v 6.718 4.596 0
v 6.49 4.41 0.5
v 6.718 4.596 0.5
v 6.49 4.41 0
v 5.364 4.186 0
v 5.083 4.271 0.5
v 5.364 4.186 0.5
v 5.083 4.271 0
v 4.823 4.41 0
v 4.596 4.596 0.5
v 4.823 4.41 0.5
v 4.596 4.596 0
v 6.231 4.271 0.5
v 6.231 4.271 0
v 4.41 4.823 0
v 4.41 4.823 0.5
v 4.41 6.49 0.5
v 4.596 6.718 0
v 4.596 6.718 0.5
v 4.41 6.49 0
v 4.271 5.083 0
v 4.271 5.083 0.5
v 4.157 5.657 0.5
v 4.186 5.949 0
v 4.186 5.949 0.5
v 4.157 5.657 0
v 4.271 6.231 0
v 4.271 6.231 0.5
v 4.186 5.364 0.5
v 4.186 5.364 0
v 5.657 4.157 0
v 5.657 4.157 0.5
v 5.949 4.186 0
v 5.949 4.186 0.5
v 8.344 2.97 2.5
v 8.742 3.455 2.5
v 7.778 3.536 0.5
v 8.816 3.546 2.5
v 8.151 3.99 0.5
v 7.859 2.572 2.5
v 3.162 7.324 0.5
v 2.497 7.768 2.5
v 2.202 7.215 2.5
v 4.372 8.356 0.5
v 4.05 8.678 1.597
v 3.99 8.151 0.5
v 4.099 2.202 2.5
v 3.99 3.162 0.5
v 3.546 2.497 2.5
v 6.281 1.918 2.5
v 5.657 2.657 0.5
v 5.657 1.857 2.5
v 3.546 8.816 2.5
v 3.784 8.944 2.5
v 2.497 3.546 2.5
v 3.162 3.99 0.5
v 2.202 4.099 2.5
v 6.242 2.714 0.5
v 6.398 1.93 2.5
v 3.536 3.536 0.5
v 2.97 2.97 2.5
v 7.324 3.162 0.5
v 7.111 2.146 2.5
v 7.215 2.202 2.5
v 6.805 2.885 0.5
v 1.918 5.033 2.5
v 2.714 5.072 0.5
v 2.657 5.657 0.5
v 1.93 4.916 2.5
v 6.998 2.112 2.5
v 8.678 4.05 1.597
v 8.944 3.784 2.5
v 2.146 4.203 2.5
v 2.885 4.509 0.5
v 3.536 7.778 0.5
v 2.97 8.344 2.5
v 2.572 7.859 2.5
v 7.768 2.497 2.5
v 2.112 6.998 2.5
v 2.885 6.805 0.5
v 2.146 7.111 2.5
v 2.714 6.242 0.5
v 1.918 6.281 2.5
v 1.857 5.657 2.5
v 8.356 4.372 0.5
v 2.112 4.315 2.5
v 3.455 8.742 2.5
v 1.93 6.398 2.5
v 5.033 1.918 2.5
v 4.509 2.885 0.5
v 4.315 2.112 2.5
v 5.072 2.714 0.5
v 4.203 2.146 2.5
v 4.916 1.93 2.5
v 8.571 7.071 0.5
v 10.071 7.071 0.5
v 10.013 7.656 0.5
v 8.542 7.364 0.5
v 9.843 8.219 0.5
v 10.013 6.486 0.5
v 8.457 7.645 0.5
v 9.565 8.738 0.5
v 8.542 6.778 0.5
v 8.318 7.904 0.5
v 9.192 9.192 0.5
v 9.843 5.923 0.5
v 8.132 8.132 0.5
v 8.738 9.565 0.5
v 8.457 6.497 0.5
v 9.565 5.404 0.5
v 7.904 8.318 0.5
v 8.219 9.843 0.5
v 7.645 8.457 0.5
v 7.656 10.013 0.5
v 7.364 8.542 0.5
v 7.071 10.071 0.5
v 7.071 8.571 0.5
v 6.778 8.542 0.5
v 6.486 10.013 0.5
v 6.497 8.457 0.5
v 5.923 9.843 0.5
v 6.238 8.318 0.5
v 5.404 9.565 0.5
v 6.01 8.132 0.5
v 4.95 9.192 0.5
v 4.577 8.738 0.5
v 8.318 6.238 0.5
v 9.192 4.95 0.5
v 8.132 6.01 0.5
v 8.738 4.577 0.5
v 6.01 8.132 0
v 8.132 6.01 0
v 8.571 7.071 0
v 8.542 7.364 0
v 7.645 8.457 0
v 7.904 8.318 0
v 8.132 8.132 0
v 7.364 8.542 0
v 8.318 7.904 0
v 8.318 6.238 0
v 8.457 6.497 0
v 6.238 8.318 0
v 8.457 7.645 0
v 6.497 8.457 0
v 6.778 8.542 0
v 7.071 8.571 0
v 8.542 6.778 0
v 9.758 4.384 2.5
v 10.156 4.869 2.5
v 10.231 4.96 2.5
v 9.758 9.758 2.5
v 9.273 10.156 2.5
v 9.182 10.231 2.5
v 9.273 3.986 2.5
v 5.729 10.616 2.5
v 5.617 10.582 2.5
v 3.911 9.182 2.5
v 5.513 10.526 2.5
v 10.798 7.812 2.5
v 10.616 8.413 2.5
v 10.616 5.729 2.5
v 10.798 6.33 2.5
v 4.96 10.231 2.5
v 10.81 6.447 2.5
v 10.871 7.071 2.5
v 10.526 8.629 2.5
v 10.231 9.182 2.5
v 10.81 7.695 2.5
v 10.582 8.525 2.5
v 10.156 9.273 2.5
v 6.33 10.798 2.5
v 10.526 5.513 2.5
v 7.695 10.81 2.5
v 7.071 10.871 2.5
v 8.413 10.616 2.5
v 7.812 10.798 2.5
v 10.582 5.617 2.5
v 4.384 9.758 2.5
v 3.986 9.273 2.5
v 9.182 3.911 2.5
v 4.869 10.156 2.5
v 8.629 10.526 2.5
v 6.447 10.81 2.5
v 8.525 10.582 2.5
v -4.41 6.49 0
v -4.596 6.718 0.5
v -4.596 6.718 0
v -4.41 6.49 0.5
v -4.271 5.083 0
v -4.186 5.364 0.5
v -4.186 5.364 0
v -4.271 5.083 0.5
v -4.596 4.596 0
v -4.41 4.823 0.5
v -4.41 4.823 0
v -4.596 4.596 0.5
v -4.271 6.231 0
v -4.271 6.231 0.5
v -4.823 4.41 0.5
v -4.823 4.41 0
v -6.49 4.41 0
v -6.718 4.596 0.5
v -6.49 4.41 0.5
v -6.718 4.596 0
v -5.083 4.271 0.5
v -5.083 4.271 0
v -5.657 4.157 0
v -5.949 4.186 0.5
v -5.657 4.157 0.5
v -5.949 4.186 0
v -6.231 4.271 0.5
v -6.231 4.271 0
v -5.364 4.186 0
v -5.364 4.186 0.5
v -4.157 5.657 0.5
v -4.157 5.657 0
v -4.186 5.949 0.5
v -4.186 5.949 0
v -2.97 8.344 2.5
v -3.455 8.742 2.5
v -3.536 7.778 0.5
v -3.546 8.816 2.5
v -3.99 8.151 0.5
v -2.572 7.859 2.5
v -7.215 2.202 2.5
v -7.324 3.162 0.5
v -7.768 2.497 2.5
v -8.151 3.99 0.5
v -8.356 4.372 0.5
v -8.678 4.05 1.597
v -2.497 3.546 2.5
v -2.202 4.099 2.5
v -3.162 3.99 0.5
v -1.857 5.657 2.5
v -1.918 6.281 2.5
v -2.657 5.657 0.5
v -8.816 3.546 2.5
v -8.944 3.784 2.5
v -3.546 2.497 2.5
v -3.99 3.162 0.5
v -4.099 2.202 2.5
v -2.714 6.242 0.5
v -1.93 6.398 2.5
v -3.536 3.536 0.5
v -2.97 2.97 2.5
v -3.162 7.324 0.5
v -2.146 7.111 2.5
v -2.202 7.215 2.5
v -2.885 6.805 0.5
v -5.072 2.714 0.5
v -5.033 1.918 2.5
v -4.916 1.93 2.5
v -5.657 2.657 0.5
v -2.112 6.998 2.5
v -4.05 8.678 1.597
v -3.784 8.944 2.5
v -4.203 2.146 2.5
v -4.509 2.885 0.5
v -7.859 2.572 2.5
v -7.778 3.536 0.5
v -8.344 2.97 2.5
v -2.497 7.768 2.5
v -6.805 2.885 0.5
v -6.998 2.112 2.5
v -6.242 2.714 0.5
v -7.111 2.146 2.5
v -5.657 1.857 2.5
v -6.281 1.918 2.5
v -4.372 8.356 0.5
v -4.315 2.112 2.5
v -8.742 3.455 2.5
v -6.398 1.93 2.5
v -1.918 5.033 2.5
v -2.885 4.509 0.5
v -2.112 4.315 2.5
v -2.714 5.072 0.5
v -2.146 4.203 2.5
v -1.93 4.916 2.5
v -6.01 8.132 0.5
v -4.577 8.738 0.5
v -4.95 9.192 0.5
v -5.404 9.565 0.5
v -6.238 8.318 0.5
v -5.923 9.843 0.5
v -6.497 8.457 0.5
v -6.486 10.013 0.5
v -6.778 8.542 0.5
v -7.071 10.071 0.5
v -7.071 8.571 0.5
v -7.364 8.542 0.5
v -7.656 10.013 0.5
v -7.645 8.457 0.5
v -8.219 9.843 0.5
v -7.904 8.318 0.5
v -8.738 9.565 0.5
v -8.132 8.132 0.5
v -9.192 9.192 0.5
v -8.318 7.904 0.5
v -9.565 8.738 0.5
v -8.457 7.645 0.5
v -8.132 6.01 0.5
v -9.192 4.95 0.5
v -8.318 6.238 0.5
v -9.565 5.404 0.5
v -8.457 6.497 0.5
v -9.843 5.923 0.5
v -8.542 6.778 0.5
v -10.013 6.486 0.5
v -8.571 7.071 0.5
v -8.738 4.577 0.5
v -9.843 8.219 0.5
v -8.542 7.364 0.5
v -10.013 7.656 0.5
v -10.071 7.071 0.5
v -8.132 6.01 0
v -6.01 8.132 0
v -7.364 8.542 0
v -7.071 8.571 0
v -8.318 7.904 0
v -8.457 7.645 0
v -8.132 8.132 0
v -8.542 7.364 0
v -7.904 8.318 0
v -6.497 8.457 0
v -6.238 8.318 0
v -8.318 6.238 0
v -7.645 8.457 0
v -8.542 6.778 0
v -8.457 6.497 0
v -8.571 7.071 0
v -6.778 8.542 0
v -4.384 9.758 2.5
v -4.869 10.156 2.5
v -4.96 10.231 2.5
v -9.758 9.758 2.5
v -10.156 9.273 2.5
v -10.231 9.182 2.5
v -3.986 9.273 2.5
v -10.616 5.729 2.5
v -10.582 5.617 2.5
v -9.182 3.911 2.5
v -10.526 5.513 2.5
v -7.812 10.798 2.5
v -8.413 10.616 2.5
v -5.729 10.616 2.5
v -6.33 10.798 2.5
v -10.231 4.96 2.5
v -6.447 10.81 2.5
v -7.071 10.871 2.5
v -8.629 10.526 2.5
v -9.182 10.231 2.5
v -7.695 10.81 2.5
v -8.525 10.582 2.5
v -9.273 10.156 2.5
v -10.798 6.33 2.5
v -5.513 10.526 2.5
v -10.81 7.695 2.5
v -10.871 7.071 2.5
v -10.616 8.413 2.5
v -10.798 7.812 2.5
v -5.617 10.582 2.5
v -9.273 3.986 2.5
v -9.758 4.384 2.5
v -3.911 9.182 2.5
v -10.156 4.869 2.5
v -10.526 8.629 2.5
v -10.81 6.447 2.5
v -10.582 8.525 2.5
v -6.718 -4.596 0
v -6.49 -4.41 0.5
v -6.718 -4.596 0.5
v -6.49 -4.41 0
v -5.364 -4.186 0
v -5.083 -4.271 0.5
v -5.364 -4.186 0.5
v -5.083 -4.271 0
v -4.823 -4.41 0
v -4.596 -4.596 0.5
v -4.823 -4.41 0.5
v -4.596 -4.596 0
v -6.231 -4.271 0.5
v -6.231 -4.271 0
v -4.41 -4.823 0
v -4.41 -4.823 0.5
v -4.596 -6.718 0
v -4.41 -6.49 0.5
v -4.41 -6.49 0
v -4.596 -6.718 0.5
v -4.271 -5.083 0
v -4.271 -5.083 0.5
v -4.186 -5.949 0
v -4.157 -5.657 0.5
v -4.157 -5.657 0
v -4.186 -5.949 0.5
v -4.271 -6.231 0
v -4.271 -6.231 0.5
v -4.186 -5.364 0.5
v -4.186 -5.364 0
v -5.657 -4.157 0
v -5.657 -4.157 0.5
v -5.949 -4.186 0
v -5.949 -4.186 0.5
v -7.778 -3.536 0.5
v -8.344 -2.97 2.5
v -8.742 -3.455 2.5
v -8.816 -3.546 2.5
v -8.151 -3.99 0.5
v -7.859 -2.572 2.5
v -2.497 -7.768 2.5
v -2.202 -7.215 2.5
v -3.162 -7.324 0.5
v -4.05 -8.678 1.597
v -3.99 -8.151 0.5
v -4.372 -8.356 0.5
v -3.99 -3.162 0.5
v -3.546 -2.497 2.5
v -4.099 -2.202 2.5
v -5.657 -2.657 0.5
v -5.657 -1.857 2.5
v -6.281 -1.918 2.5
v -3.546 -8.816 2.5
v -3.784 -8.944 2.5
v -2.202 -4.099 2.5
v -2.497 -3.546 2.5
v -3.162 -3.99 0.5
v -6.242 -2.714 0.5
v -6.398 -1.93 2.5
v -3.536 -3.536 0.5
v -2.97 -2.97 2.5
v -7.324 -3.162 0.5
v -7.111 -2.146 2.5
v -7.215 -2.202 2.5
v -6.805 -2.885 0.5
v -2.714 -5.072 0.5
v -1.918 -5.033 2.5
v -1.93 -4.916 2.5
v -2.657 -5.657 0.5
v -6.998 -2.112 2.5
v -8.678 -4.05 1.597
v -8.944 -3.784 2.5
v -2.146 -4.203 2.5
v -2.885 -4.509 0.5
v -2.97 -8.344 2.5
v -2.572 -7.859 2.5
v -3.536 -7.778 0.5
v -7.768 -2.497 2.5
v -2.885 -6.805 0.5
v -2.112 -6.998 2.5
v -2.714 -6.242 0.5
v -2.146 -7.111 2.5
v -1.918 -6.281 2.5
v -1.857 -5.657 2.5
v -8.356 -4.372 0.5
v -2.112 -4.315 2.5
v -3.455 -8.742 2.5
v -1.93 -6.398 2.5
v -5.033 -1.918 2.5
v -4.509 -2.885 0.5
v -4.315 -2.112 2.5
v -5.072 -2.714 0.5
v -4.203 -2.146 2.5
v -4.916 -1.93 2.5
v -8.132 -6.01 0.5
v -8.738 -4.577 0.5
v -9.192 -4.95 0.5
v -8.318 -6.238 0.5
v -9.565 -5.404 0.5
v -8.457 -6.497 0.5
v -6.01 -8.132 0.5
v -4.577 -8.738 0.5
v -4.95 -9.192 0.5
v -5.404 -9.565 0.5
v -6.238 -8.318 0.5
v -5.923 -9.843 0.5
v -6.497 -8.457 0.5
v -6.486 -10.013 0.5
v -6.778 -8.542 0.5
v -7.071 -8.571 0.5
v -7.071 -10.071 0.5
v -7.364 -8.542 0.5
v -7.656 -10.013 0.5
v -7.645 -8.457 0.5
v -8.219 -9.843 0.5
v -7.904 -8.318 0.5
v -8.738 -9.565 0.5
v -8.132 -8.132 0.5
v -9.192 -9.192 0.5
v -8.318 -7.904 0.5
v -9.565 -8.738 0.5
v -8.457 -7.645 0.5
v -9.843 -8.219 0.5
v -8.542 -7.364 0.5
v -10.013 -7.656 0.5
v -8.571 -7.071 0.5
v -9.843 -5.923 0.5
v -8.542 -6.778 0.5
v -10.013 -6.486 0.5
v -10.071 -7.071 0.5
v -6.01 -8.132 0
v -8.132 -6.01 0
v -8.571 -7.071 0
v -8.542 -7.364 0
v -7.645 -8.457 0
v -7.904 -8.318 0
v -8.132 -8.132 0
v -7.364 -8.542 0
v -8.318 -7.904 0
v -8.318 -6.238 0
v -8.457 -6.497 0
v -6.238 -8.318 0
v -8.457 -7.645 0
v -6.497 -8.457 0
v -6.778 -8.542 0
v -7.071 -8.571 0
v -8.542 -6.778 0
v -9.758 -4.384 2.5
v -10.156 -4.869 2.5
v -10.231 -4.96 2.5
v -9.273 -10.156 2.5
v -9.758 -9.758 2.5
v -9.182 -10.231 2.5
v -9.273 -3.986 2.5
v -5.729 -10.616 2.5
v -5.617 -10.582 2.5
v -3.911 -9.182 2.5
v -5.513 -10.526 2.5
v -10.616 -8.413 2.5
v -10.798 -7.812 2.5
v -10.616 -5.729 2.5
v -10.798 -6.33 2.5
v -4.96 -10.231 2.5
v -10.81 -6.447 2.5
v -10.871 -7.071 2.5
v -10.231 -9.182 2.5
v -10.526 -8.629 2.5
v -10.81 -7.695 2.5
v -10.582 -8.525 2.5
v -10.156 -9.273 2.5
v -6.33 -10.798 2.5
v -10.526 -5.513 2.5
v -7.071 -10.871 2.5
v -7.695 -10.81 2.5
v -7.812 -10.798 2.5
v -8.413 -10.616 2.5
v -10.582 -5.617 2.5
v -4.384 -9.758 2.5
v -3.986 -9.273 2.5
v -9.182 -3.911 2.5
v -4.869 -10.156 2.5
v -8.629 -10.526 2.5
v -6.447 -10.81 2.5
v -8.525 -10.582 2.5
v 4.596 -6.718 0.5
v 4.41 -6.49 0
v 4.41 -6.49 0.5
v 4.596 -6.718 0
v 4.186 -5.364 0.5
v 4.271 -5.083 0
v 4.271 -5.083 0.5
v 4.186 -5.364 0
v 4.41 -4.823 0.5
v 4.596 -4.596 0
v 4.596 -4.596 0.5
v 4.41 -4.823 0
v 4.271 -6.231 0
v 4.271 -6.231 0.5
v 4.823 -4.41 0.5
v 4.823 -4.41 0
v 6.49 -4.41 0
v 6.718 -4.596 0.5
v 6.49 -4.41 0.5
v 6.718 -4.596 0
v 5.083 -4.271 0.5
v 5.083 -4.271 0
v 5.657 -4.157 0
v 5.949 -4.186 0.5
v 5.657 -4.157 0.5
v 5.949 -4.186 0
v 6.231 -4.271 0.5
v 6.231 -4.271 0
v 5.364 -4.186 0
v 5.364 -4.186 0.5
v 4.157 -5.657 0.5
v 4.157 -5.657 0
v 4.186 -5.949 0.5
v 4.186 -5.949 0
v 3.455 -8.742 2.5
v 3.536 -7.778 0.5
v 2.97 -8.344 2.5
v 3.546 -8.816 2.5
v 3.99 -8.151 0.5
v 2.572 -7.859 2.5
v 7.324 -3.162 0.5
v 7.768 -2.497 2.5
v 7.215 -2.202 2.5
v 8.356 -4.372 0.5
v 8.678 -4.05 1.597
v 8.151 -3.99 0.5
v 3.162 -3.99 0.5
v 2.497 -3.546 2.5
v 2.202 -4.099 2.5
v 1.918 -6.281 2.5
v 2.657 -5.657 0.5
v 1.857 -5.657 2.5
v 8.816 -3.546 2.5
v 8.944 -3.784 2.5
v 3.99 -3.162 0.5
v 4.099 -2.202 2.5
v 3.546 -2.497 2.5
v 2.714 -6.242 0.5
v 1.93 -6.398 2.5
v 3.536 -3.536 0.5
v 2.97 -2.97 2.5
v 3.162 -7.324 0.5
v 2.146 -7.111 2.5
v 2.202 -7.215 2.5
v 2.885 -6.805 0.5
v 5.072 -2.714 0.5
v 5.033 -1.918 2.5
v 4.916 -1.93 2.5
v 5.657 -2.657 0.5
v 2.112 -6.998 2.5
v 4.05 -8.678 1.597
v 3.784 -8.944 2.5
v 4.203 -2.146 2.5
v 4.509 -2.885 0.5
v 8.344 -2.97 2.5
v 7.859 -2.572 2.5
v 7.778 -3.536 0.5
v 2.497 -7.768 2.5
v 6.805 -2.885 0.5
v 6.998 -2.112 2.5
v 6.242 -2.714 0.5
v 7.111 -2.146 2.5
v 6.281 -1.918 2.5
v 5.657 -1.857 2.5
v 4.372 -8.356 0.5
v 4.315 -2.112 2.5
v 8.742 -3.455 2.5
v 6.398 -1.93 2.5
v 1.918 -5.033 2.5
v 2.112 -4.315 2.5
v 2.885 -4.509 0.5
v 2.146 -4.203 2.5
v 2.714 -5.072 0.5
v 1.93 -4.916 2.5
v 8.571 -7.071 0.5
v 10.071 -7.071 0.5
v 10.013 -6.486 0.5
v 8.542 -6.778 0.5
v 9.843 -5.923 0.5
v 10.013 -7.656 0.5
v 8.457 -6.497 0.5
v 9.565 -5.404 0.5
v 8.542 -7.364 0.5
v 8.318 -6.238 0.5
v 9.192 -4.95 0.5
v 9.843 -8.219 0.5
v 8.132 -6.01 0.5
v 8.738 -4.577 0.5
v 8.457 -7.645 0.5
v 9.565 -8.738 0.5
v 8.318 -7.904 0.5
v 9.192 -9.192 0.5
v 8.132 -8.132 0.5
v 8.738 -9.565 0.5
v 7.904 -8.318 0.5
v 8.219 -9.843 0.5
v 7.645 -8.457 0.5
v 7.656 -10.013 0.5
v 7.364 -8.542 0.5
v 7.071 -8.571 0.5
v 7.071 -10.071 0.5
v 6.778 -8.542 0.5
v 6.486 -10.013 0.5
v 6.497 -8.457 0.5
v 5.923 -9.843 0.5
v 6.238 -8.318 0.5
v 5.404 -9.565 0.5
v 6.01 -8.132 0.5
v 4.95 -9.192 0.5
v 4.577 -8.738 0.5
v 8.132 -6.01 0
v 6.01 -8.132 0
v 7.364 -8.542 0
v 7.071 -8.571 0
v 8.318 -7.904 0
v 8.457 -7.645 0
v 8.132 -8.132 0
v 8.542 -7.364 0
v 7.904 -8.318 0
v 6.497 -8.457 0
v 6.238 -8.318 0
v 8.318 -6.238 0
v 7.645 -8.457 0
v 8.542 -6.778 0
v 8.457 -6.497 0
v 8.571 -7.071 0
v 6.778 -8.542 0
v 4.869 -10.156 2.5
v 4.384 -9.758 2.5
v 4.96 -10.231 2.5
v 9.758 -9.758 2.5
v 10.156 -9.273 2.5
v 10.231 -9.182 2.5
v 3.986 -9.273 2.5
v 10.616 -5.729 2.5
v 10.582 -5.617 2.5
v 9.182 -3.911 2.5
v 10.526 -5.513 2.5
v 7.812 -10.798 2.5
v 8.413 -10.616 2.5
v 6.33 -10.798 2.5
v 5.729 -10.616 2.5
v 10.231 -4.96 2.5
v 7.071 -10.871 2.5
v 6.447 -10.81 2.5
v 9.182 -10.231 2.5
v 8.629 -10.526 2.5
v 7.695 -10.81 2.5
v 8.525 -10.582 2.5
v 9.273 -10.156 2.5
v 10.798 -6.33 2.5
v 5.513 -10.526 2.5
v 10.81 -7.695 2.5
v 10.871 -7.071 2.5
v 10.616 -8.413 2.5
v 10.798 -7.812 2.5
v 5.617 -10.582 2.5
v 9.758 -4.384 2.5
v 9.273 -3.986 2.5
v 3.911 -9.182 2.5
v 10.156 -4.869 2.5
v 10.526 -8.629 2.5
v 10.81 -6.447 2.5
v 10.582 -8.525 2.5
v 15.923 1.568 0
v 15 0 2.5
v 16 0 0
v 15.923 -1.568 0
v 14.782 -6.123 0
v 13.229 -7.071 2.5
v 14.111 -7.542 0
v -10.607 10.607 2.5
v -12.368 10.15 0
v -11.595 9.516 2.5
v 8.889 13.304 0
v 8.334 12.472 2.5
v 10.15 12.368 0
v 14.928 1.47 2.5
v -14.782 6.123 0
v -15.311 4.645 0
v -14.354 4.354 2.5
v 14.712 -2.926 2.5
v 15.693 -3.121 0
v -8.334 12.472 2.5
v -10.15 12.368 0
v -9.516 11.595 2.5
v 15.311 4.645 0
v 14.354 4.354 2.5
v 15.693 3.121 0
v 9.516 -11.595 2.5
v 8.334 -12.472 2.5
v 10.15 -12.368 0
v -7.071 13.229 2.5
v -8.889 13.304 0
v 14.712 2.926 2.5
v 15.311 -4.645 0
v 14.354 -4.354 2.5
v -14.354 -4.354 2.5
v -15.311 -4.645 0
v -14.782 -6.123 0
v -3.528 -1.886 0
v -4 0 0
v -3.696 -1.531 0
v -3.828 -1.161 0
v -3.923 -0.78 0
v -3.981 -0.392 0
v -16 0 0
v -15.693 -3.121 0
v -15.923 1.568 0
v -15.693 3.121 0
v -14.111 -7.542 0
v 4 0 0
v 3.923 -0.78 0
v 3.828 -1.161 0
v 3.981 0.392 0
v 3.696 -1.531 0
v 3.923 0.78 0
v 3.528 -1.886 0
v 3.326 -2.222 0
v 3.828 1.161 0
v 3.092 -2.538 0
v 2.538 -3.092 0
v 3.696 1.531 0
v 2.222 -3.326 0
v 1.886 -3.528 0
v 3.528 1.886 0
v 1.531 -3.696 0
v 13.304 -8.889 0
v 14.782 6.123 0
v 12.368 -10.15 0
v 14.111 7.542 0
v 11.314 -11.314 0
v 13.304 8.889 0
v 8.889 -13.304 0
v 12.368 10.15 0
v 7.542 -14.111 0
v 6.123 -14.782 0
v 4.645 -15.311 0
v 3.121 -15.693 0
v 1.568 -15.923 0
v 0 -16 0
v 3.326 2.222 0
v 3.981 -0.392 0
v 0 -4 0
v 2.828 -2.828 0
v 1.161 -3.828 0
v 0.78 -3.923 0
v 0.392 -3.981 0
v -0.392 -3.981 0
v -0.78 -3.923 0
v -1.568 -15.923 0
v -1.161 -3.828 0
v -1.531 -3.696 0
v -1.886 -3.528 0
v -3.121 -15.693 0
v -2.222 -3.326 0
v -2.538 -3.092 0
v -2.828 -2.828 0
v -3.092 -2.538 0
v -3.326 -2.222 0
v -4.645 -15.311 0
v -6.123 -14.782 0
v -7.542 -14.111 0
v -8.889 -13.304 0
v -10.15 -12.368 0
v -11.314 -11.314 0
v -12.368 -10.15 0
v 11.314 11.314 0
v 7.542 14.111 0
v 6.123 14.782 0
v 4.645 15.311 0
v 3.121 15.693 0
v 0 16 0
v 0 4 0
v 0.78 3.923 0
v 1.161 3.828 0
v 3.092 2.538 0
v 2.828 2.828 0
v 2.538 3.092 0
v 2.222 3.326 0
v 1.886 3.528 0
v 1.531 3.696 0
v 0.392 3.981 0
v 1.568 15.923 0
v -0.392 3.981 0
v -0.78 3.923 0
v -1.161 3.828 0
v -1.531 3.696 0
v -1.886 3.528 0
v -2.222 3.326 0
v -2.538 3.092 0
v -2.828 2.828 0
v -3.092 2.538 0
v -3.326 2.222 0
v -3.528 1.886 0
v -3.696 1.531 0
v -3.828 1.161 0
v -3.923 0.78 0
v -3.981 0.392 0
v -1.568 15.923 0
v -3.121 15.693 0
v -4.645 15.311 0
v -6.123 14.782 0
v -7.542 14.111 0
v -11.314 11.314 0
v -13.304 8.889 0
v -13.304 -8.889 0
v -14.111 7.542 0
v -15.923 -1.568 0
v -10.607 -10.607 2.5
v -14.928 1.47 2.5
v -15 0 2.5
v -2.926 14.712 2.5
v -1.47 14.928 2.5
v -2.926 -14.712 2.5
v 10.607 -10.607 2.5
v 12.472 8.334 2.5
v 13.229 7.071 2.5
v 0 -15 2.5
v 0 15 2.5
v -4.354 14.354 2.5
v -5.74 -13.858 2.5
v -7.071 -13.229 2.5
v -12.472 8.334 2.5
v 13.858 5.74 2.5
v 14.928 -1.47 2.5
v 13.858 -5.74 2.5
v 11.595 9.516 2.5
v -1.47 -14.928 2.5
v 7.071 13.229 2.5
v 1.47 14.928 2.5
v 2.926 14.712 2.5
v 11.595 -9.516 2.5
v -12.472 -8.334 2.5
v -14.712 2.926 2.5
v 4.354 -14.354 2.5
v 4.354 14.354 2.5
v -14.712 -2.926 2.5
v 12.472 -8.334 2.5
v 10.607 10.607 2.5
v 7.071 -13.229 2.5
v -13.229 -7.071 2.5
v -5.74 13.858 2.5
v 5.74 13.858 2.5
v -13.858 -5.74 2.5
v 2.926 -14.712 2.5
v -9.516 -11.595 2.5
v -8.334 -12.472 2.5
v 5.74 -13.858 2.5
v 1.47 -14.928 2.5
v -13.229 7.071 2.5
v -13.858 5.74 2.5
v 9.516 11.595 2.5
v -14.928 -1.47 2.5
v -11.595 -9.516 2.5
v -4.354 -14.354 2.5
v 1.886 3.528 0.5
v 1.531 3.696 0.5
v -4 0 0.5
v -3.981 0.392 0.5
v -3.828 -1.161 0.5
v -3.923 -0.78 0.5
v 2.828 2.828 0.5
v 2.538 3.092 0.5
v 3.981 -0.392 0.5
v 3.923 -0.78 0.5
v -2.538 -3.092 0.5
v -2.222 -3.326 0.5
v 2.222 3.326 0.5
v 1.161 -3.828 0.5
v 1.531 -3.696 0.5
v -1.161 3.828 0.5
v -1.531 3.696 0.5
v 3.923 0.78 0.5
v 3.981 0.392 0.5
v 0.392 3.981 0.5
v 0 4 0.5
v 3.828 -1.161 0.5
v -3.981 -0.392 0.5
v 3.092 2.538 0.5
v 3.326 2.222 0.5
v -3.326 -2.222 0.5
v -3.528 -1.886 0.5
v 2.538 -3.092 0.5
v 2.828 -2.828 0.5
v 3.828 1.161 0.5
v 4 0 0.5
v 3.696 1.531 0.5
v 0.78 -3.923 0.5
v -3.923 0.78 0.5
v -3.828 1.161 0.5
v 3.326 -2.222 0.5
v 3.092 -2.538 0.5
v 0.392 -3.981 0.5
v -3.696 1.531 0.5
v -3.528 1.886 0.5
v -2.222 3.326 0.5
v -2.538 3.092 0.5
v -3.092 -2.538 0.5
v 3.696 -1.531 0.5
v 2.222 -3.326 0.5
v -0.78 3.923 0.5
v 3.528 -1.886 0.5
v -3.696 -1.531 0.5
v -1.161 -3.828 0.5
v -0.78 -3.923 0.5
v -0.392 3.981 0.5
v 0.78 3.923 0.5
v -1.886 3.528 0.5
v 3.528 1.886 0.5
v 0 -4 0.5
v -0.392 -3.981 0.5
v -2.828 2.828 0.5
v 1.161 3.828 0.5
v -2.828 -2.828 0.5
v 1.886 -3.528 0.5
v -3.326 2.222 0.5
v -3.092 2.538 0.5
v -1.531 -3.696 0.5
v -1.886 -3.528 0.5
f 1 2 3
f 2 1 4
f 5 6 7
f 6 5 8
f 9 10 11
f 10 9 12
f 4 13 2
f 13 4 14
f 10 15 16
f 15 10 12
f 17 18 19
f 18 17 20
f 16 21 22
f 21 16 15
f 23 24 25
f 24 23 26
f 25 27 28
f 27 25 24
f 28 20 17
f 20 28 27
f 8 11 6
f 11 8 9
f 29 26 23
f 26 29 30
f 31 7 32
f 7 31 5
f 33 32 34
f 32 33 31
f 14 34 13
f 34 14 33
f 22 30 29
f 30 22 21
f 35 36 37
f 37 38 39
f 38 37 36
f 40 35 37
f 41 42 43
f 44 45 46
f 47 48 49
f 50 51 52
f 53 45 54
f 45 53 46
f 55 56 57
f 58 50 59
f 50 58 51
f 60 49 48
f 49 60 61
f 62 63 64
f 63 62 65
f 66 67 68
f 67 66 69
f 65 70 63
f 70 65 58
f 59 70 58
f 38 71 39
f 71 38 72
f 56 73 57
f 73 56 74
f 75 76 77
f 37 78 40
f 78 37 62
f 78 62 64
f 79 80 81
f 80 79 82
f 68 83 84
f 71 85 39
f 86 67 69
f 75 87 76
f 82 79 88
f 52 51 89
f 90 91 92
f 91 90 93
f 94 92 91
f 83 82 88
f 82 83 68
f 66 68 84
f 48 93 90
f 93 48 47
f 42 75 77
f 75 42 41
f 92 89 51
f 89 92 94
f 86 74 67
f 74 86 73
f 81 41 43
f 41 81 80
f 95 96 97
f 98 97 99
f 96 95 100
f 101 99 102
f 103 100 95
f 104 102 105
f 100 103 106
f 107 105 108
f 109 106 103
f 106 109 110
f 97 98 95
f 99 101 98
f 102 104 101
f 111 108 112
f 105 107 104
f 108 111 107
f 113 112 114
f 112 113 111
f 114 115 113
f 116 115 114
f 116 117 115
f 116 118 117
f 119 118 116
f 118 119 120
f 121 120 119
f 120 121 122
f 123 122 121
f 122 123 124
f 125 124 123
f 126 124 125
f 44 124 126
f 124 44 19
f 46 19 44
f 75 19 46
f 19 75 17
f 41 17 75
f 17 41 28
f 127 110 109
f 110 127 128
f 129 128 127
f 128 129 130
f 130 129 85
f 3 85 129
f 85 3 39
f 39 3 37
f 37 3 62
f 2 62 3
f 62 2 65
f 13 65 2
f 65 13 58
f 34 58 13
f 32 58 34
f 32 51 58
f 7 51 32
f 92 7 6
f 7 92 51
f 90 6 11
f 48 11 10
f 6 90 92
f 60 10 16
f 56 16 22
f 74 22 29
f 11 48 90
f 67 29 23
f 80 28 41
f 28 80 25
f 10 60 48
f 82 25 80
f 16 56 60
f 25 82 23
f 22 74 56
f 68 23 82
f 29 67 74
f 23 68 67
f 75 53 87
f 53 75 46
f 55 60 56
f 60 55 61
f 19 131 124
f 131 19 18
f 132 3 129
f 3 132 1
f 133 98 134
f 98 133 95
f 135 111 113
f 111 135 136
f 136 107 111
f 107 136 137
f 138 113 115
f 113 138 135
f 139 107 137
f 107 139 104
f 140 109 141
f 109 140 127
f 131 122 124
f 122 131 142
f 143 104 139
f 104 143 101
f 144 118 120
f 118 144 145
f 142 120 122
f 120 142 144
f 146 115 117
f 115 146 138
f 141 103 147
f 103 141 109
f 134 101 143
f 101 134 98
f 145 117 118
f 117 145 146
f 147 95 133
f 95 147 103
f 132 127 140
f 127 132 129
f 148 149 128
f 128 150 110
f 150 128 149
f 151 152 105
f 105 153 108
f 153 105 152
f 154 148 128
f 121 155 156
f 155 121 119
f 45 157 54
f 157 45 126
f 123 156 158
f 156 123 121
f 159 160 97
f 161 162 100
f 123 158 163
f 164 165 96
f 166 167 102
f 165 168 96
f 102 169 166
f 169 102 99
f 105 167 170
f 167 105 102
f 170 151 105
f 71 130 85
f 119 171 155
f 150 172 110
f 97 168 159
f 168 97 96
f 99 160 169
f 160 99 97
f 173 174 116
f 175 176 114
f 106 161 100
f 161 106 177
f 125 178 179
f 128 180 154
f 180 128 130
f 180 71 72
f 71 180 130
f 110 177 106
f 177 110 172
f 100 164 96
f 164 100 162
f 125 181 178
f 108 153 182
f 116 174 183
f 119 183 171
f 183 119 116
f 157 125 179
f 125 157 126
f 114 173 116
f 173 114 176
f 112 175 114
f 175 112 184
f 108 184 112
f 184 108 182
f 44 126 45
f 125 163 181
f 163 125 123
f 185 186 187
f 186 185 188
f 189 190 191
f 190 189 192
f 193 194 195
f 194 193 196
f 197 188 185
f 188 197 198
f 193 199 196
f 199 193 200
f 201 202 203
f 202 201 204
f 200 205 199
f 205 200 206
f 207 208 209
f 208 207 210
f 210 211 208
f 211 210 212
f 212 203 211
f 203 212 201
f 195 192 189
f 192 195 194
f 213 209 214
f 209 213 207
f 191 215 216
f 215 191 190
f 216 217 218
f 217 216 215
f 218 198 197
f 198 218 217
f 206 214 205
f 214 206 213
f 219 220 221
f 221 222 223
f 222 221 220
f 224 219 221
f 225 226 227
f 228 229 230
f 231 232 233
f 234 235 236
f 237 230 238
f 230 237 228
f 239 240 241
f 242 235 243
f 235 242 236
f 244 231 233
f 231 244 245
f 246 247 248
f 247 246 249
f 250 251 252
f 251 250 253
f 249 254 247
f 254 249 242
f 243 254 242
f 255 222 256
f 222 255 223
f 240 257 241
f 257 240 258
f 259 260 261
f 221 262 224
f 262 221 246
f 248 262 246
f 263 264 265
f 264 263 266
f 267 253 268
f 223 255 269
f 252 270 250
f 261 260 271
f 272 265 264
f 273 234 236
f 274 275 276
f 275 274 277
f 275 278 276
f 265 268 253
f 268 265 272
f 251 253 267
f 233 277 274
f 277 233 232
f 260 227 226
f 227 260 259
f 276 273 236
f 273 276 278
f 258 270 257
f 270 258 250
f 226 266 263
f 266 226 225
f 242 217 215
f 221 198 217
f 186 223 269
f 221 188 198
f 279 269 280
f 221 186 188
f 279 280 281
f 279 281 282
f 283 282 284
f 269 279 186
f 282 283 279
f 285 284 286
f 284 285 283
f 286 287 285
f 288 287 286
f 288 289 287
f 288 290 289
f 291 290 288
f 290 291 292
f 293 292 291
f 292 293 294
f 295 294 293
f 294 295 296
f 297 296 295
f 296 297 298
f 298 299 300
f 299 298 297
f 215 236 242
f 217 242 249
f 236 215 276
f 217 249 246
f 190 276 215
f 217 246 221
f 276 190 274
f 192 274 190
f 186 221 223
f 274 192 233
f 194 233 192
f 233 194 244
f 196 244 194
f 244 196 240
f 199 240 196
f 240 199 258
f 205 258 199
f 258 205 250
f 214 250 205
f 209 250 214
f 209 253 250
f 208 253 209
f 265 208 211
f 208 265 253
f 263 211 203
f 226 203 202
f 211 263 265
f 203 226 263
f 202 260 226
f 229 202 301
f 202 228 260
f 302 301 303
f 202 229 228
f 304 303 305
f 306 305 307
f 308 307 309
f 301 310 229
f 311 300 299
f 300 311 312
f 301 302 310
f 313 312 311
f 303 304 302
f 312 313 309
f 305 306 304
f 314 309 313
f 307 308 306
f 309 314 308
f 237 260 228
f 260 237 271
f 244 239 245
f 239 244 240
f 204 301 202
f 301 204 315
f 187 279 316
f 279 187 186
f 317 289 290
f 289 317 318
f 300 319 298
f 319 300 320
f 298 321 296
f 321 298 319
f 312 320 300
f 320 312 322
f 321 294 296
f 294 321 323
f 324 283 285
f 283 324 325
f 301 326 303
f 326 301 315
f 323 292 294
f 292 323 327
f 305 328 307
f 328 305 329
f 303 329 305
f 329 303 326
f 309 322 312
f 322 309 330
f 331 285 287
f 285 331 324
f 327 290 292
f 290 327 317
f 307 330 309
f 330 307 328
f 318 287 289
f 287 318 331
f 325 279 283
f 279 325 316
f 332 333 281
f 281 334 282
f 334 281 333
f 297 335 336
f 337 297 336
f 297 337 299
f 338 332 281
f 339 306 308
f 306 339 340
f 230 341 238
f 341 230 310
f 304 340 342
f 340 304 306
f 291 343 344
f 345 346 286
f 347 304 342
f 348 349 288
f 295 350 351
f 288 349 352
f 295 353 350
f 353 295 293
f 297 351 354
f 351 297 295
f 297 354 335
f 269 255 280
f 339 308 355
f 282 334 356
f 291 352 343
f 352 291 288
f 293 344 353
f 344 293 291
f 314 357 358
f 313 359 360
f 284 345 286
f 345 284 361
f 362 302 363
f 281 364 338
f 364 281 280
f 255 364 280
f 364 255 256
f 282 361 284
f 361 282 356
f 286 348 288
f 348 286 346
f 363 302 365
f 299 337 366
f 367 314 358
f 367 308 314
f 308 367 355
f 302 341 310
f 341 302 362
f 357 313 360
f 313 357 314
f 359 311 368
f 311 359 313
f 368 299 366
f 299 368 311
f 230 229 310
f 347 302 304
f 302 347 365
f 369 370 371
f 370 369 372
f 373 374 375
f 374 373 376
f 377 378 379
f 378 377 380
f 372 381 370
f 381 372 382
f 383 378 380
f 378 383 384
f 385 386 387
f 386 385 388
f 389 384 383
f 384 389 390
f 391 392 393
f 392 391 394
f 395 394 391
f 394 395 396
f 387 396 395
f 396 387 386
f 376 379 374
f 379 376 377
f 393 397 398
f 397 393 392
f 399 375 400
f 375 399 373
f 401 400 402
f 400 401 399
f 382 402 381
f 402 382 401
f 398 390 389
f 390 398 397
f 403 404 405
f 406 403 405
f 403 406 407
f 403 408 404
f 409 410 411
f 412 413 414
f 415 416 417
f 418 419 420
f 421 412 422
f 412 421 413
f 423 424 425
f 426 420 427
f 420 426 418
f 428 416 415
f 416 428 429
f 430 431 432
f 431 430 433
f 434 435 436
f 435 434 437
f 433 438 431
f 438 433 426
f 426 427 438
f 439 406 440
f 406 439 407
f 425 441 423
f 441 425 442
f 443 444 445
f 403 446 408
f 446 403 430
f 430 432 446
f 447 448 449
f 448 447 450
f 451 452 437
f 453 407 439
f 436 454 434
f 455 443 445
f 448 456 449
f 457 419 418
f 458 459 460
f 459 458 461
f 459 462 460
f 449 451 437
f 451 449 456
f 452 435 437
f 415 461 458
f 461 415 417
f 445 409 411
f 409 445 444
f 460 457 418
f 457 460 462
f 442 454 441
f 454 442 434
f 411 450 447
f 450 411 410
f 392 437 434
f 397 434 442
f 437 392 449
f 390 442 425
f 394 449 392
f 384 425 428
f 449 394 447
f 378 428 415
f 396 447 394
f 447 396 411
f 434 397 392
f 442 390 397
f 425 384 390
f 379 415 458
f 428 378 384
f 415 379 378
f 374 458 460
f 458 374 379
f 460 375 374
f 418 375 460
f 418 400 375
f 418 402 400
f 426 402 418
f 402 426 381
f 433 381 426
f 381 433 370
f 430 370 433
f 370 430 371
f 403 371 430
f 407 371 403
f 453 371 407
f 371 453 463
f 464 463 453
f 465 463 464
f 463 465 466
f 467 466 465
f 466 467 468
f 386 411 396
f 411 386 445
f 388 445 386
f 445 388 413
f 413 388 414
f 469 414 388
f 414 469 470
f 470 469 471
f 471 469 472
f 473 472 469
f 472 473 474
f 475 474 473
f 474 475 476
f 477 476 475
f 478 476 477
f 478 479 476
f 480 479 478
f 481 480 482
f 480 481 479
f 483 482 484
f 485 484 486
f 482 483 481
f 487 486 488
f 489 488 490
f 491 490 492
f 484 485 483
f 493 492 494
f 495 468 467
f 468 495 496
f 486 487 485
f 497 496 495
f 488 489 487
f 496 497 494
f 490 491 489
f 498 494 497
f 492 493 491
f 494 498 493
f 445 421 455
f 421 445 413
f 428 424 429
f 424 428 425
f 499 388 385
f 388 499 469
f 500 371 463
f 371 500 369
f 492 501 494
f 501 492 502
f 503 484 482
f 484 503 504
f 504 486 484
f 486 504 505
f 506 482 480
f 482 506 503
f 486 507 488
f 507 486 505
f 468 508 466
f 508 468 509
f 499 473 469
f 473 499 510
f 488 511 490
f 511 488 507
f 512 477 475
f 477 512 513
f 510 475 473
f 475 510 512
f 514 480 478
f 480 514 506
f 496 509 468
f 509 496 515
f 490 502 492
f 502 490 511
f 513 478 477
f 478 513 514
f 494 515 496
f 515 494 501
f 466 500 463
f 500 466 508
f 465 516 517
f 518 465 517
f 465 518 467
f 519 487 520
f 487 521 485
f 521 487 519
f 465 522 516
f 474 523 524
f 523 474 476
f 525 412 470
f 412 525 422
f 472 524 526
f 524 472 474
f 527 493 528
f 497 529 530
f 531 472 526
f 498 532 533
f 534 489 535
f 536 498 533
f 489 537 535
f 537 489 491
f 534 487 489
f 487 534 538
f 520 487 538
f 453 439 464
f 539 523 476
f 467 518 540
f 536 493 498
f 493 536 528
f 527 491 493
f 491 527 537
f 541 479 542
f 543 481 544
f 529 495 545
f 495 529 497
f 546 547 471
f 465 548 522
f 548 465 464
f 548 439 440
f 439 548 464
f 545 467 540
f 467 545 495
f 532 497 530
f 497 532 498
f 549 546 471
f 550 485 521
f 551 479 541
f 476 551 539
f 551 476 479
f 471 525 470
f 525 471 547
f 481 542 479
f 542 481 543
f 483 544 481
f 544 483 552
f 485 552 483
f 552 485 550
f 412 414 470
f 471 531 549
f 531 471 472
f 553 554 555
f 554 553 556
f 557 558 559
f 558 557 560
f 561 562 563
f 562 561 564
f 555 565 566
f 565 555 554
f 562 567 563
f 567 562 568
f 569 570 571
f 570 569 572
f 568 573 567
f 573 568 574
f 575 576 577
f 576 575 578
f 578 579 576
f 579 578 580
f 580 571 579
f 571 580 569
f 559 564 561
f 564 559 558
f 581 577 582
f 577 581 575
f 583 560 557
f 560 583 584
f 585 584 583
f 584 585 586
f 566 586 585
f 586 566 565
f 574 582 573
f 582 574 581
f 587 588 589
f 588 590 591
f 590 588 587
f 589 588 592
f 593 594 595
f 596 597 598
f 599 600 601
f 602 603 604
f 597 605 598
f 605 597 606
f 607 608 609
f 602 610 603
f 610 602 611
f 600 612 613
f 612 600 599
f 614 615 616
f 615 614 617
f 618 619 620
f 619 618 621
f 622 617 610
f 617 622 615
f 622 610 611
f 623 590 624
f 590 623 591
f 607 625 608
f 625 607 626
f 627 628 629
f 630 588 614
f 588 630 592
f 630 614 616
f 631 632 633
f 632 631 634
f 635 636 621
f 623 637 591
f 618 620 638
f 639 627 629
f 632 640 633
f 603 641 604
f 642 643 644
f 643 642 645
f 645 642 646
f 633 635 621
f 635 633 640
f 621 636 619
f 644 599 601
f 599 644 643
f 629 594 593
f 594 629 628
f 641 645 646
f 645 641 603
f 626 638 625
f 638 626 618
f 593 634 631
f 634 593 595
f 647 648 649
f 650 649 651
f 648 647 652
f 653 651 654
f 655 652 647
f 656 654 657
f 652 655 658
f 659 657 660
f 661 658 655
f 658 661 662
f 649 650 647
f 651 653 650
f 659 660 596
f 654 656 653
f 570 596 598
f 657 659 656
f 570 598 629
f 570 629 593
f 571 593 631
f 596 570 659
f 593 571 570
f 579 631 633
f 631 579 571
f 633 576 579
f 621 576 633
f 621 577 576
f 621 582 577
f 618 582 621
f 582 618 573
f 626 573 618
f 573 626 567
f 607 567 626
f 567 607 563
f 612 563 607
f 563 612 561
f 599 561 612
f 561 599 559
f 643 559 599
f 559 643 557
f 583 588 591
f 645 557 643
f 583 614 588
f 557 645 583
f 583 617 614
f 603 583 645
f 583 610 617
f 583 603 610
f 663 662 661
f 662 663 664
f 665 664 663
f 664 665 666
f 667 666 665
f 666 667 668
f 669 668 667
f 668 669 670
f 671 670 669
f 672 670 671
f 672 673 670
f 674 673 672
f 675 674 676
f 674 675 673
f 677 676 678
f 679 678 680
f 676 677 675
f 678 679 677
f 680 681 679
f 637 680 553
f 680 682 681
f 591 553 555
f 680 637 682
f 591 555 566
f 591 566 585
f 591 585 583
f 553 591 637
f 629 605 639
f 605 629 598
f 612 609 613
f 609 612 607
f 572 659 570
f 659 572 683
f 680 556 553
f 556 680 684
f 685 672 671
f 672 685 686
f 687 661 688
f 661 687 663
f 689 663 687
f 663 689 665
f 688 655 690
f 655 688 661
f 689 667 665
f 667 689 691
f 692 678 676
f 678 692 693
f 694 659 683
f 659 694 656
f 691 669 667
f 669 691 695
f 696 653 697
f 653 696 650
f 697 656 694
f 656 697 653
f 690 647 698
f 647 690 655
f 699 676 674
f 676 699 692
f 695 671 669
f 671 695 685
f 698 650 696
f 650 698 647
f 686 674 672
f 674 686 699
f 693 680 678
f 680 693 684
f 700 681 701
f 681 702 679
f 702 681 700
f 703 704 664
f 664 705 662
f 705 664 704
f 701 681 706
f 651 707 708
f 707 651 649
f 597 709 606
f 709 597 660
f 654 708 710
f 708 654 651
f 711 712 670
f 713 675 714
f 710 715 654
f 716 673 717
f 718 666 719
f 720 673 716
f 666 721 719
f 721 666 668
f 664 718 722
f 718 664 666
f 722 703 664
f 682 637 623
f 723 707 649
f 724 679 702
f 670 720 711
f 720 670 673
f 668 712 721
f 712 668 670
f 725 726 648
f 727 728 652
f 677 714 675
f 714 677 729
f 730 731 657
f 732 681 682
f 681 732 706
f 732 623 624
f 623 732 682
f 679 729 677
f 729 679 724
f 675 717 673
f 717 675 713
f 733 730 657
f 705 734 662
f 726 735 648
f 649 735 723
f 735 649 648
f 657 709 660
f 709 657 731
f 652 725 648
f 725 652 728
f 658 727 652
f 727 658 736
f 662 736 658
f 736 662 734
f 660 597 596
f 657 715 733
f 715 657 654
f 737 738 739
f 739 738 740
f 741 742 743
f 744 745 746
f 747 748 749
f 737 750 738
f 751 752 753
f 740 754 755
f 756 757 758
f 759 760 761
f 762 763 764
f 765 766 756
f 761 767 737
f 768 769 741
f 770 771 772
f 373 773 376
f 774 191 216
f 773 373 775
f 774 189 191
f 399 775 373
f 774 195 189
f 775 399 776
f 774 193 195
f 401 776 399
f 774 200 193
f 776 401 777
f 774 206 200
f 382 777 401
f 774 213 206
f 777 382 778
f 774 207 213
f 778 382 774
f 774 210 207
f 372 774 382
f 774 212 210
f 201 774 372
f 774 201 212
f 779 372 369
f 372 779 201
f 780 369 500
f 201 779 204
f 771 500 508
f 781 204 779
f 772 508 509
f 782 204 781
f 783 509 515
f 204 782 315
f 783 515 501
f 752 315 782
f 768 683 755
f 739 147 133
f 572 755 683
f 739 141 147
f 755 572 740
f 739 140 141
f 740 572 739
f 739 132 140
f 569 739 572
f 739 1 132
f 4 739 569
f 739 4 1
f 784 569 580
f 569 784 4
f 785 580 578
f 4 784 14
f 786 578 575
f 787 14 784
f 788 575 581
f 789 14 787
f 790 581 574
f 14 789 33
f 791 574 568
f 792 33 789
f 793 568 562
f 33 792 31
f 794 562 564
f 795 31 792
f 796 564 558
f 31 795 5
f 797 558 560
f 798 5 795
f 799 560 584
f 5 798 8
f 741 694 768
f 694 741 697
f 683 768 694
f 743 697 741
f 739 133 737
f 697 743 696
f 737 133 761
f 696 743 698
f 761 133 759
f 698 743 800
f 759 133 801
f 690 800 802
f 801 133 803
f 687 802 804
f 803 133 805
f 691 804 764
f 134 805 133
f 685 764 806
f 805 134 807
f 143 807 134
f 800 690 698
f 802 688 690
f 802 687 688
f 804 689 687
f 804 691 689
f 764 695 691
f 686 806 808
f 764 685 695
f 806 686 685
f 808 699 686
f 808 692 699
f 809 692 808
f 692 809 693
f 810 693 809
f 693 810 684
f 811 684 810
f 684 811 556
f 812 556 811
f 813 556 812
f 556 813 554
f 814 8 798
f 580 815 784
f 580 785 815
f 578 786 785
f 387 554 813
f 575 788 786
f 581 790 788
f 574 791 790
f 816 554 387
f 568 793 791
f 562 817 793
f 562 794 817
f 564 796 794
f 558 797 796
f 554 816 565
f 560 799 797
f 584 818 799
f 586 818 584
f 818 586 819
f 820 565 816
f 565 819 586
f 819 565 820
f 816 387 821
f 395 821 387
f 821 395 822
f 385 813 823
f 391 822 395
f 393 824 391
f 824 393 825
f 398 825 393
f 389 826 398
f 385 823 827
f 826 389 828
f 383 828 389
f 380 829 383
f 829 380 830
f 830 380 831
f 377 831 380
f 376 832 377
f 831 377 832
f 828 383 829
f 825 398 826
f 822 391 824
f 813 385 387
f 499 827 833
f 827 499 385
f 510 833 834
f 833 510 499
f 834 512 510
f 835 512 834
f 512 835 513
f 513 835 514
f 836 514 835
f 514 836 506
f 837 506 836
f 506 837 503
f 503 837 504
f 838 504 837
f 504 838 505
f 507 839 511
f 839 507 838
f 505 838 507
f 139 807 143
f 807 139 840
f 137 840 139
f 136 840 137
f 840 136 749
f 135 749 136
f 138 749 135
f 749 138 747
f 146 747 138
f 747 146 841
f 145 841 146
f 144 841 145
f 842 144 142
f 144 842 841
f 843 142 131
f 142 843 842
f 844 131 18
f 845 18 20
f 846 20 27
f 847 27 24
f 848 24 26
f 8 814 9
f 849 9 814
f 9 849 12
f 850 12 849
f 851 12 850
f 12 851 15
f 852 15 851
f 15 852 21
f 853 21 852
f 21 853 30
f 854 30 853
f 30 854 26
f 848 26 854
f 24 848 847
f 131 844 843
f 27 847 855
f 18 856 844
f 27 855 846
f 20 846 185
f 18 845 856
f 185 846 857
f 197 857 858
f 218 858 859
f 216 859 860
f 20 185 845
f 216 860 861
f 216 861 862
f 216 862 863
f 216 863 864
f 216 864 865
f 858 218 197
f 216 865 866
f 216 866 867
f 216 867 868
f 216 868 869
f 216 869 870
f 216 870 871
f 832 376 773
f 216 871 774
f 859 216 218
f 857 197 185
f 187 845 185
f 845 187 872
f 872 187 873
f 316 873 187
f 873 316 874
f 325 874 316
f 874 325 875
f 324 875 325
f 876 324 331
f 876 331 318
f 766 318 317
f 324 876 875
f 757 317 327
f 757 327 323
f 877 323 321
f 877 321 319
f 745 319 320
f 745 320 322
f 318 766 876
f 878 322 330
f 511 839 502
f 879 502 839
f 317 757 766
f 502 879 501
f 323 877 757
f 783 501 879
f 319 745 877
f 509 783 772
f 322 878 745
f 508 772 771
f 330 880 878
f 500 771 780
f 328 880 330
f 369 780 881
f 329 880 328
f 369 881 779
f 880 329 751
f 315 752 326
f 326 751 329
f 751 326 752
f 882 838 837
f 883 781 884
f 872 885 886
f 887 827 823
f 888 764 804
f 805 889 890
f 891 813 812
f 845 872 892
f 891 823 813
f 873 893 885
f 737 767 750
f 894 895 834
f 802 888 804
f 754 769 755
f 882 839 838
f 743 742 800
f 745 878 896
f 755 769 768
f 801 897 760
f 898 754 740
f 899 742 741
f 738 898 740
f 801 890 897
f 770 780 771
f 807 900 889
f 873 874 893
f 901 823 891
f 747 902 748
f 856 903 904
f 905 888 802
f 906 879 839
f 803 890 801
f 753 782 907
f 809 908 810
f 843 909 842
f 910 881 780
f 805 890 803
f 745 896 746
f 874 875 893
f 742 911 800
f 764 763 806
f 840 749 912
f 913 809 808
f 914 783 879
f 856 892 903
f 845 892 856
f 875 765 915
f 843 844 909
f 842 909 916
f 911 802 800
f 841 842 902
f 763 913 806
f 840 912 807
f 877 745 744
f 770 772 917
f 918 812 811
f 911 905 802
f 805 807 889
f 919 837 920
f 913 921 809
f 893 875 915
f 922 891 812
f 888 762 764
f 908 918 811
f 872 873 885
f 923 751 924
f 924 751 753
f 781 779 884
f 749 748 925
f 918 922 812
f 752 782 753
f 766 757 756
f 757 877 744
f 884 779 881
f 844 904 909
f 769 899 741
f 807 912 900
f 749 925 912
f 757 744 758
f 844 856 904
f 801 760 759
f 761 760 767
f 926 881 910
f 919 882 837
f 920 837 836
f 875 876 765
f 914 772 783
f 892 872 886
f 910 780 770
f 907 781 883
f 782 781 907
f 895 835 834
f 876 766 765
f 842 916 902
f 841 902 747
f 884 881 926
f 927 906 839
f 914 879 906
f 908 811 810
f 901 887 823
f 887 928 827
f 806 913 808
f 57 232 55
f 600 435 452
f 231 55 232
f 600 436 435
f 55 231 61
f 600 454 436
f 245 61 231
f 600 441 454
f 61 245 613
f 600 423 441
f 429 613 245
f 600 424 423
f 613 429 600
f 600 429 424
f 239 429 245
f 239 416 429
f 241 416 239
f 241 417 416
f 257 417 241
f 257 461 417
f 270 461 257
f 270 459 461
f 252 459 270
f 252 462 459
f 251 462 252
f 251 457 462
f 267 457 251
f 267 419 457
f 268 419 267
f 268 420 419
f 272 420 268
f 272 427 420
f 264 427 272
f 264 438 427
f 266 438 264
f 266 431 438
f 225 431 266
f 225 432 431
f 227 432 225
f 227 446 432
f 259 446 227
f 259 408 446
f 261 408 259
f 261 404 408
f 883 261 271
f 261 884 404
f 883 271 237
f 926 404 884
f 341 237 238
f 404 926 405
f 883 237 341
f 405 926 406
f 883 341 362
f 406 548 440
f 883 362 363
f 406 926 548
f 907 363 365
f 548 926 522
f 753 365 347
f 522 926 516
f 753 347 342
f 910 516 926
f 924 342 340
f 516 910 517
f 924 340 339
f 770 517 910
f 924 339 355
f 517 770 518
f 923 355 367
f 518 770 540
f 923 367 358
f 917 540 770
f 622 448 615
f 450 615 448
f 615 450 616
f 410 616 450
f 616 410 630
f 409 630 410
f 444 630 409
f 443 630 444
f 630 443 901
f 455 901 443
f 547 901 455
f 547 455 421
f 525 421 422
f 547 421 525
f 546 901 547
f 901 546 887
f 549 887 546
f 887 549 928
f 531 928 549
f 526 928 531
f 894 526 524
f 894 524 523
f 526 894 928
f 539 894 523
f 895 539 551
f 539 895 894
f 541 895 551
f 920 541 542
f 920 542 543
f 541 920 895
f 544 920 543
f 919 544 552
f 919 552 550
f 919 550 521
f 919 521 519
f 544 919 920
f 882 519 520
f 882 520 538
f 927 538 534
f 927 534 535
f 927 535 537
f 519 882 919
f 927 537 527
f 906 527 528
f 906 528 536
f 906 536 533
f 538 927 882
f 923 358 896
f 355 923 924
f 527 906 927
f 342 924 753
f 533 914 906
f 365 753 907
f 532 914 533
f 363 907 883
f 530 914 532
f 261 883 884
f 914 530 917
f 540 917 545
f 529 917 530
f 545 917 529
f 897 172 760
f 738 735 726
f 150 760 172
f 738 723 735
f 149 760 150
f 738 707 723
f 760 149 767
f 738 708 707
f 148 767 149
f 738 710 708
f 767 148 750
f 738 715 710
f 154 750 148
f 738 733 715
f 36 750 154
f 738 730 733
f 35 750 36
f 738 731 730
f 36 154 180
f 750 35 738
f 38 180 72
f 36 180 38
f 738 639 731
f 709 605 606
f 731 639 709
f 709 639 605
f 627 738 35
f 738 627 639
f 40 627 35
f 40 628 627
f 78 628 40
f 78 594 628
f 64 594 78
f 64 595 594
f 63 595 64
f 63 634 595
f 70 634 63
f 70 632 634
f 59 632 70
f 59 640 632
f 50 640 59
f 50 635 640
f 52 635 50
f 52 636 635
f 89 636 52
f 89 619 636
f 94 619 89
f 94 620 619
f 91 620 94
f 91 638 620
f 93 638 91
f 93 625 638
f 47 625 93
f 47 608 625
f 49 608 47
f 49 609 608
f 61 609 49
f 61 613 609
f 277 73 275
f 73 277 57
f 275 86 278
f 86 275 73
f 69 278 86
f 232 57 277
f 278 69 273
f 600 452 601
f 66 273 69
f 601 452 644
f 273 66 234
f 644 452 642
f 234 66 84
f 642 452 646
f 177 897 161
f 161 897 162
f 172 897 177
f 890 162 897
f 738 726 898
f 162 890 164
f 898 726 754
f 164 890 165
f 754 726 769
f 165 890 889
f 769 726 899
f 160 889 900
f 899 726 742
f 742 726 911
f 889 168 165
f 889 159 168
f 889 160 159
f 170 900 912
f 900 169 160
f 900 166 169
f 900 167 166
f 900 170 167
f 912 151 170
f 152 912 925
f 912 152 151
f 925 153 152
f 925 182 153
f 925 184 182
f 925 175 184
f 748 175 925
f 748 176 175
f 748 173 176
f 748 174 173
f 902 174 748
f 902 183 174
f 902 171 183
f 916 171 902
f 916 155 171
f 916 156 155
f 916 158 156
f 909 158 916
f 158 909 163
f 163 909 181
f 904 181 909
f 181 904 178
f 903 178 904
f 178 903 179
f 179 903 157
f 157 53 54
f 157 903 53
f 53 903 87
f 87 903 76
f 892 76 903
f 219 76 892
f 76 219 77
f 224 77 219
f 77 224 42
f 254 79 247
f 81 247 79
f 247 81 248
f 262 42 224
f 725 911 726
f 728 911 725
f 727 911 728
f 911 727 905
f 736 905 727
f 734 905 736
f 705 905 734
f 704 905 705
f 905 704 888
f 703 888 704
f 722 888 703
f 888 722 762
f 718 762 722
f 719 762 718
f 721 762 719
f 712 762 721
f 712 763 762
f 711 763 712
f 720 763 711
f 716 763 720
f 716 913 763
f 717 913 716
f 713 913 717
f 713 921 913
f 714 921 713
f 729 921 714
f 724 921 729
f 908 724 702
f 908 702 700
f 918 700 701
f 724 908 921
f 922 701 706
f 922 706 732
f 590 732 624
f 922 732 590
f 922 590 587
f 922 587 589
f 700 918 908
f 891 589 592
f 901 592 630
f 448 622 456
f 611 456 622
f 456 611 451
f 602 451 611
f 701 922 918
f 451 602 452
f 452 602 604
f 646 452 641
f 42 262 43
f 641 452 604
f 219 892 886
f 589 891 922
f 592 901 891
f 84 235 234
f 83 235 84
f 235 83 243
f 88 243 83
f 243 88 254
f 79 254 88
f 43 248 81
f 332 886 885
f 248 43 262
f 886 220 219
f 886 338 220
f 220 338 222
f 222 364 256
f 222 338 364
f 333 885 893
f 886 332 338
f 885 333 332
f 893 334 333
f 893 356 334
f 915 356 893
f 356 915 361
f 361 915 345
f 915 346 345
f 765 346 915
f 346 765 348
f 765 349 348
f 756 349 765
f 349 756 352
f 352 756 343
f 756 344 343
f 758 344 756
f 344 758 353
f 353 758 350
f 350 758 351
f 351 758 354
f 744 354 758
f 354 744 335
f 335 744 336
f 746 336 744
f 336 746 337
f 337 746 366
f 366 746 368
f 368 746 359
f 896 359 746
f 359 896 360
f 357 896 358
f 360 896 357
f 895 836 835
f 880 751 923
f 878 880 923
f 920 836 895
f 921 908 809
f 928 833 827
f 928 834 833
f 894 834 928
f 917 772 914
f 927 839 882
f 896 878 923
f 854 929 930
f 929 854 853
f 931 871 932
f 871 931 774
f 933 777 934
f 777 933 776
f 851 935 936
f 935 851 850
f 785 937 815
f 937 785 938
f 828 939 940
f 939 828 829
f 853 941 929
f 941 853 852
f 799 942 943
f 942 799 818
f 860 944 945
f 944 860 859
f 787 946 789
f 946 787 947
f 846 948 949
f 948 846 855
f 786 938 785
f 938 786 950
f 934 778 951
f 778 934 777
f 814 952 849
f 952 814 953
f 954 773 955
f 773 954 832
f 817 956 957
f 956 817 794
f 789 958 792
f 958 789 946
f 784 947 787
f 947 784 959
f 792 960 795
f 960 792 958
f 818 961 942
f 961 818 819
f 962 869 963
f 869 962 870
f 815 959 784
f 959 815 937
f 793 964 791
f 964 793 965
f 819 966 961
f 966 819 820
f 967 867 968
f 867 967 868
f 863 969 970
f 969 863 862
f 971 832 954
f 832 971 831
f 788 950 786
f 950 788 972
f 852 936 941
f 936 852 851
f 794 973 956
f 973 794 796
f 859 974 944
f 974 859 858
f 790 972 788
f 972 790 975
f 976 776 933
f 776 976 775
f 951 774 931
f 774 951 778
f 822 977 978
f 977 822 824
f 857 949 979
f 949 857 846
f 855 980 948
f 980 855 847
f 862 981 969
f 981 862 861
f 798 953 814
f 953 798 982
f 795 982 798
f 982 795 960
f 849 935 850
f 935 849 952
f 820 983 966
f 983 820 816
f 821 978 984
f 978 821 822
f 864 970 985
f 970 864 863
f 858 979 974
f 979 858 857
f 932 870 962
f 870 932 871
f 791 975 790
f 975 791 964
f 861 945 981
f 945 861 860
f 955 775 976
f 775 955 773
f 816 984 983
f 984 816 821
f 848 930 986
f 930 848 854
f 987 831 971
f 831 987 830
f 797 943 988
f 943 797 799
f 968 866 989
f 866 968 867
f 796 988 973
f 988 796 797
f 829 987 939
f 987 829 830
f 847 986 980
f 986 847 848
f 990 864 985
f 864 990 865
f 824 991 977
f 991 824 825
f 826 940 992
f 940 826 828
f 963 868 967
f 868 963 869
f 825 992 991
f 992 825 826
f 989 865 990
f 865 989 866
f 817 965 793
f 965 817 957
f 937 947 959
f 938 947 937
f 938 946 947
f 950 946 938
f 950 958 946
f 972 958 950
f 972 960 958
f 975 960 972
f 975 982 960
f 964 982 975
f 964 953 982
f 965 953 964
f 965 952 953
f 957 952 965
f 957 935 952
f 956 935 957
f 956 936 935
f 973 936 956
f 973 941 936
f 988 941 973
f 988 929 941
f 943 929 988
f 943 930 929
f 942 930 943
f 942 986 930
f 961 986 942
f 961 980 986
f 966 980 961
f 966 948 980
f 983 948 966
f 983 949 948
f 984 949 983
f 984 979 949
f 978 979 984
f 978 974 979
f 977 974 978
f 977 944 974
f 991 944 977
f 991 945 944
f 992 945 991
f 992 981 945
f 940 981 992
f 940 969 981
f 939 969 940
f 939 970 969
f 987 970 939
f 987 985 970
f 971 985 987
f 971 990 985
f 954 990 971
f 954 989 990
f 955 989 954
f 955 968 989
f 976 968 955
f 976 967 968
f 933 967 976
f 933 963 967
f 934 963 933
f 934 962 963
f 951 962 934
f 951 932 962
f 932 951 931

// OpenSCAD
armDiameter=32;
plateTilt=2;
screwHeight=0.5;
height=2.5;

motorAxleIndent=0.5;

holeDiameter=3;
holeHeadDiameter=6;
holeDistanceMin=8;
holeDistanceMax=10;

difference() {
    cylinder(d=armDiameter,d2=armDiameter-plateTilt,h=height,$fn=64);
	 cylinder(d=holeDistanceMin,h=motorAxleIndent,$fn=64);
	
    for(r=[0,90,180,270])
    {
        rotate([0,0,r+45])
        union() {
				translate([holeDistanceMin,0,-1])
				cylinder(d=holeDiameter,h=height,$fn=32);
            translate([holeDistanceMin,0,screwHeight])
            cylinder(d=holeHeadDiameter,d2=holeHeadDiameter+plateTilt,h=height,$fn=32);

				translate([holeDistanceMin,-holeDiameter/2,-1])
				cube([holeDistanceMax-holeDistanceMin,holeDiameter,height]);

				translate([holeDistanceMax,0,-1])
				cylinder(d=holeDiameter,h=height,$fn=32);
            translate([holeDistanceMax,0,screwHeight])
            cylinder(d=holeHeadDiameter,d2=holeHeadDiameter+plateTilt,h=height,$fn=32);
        }
    }
}
